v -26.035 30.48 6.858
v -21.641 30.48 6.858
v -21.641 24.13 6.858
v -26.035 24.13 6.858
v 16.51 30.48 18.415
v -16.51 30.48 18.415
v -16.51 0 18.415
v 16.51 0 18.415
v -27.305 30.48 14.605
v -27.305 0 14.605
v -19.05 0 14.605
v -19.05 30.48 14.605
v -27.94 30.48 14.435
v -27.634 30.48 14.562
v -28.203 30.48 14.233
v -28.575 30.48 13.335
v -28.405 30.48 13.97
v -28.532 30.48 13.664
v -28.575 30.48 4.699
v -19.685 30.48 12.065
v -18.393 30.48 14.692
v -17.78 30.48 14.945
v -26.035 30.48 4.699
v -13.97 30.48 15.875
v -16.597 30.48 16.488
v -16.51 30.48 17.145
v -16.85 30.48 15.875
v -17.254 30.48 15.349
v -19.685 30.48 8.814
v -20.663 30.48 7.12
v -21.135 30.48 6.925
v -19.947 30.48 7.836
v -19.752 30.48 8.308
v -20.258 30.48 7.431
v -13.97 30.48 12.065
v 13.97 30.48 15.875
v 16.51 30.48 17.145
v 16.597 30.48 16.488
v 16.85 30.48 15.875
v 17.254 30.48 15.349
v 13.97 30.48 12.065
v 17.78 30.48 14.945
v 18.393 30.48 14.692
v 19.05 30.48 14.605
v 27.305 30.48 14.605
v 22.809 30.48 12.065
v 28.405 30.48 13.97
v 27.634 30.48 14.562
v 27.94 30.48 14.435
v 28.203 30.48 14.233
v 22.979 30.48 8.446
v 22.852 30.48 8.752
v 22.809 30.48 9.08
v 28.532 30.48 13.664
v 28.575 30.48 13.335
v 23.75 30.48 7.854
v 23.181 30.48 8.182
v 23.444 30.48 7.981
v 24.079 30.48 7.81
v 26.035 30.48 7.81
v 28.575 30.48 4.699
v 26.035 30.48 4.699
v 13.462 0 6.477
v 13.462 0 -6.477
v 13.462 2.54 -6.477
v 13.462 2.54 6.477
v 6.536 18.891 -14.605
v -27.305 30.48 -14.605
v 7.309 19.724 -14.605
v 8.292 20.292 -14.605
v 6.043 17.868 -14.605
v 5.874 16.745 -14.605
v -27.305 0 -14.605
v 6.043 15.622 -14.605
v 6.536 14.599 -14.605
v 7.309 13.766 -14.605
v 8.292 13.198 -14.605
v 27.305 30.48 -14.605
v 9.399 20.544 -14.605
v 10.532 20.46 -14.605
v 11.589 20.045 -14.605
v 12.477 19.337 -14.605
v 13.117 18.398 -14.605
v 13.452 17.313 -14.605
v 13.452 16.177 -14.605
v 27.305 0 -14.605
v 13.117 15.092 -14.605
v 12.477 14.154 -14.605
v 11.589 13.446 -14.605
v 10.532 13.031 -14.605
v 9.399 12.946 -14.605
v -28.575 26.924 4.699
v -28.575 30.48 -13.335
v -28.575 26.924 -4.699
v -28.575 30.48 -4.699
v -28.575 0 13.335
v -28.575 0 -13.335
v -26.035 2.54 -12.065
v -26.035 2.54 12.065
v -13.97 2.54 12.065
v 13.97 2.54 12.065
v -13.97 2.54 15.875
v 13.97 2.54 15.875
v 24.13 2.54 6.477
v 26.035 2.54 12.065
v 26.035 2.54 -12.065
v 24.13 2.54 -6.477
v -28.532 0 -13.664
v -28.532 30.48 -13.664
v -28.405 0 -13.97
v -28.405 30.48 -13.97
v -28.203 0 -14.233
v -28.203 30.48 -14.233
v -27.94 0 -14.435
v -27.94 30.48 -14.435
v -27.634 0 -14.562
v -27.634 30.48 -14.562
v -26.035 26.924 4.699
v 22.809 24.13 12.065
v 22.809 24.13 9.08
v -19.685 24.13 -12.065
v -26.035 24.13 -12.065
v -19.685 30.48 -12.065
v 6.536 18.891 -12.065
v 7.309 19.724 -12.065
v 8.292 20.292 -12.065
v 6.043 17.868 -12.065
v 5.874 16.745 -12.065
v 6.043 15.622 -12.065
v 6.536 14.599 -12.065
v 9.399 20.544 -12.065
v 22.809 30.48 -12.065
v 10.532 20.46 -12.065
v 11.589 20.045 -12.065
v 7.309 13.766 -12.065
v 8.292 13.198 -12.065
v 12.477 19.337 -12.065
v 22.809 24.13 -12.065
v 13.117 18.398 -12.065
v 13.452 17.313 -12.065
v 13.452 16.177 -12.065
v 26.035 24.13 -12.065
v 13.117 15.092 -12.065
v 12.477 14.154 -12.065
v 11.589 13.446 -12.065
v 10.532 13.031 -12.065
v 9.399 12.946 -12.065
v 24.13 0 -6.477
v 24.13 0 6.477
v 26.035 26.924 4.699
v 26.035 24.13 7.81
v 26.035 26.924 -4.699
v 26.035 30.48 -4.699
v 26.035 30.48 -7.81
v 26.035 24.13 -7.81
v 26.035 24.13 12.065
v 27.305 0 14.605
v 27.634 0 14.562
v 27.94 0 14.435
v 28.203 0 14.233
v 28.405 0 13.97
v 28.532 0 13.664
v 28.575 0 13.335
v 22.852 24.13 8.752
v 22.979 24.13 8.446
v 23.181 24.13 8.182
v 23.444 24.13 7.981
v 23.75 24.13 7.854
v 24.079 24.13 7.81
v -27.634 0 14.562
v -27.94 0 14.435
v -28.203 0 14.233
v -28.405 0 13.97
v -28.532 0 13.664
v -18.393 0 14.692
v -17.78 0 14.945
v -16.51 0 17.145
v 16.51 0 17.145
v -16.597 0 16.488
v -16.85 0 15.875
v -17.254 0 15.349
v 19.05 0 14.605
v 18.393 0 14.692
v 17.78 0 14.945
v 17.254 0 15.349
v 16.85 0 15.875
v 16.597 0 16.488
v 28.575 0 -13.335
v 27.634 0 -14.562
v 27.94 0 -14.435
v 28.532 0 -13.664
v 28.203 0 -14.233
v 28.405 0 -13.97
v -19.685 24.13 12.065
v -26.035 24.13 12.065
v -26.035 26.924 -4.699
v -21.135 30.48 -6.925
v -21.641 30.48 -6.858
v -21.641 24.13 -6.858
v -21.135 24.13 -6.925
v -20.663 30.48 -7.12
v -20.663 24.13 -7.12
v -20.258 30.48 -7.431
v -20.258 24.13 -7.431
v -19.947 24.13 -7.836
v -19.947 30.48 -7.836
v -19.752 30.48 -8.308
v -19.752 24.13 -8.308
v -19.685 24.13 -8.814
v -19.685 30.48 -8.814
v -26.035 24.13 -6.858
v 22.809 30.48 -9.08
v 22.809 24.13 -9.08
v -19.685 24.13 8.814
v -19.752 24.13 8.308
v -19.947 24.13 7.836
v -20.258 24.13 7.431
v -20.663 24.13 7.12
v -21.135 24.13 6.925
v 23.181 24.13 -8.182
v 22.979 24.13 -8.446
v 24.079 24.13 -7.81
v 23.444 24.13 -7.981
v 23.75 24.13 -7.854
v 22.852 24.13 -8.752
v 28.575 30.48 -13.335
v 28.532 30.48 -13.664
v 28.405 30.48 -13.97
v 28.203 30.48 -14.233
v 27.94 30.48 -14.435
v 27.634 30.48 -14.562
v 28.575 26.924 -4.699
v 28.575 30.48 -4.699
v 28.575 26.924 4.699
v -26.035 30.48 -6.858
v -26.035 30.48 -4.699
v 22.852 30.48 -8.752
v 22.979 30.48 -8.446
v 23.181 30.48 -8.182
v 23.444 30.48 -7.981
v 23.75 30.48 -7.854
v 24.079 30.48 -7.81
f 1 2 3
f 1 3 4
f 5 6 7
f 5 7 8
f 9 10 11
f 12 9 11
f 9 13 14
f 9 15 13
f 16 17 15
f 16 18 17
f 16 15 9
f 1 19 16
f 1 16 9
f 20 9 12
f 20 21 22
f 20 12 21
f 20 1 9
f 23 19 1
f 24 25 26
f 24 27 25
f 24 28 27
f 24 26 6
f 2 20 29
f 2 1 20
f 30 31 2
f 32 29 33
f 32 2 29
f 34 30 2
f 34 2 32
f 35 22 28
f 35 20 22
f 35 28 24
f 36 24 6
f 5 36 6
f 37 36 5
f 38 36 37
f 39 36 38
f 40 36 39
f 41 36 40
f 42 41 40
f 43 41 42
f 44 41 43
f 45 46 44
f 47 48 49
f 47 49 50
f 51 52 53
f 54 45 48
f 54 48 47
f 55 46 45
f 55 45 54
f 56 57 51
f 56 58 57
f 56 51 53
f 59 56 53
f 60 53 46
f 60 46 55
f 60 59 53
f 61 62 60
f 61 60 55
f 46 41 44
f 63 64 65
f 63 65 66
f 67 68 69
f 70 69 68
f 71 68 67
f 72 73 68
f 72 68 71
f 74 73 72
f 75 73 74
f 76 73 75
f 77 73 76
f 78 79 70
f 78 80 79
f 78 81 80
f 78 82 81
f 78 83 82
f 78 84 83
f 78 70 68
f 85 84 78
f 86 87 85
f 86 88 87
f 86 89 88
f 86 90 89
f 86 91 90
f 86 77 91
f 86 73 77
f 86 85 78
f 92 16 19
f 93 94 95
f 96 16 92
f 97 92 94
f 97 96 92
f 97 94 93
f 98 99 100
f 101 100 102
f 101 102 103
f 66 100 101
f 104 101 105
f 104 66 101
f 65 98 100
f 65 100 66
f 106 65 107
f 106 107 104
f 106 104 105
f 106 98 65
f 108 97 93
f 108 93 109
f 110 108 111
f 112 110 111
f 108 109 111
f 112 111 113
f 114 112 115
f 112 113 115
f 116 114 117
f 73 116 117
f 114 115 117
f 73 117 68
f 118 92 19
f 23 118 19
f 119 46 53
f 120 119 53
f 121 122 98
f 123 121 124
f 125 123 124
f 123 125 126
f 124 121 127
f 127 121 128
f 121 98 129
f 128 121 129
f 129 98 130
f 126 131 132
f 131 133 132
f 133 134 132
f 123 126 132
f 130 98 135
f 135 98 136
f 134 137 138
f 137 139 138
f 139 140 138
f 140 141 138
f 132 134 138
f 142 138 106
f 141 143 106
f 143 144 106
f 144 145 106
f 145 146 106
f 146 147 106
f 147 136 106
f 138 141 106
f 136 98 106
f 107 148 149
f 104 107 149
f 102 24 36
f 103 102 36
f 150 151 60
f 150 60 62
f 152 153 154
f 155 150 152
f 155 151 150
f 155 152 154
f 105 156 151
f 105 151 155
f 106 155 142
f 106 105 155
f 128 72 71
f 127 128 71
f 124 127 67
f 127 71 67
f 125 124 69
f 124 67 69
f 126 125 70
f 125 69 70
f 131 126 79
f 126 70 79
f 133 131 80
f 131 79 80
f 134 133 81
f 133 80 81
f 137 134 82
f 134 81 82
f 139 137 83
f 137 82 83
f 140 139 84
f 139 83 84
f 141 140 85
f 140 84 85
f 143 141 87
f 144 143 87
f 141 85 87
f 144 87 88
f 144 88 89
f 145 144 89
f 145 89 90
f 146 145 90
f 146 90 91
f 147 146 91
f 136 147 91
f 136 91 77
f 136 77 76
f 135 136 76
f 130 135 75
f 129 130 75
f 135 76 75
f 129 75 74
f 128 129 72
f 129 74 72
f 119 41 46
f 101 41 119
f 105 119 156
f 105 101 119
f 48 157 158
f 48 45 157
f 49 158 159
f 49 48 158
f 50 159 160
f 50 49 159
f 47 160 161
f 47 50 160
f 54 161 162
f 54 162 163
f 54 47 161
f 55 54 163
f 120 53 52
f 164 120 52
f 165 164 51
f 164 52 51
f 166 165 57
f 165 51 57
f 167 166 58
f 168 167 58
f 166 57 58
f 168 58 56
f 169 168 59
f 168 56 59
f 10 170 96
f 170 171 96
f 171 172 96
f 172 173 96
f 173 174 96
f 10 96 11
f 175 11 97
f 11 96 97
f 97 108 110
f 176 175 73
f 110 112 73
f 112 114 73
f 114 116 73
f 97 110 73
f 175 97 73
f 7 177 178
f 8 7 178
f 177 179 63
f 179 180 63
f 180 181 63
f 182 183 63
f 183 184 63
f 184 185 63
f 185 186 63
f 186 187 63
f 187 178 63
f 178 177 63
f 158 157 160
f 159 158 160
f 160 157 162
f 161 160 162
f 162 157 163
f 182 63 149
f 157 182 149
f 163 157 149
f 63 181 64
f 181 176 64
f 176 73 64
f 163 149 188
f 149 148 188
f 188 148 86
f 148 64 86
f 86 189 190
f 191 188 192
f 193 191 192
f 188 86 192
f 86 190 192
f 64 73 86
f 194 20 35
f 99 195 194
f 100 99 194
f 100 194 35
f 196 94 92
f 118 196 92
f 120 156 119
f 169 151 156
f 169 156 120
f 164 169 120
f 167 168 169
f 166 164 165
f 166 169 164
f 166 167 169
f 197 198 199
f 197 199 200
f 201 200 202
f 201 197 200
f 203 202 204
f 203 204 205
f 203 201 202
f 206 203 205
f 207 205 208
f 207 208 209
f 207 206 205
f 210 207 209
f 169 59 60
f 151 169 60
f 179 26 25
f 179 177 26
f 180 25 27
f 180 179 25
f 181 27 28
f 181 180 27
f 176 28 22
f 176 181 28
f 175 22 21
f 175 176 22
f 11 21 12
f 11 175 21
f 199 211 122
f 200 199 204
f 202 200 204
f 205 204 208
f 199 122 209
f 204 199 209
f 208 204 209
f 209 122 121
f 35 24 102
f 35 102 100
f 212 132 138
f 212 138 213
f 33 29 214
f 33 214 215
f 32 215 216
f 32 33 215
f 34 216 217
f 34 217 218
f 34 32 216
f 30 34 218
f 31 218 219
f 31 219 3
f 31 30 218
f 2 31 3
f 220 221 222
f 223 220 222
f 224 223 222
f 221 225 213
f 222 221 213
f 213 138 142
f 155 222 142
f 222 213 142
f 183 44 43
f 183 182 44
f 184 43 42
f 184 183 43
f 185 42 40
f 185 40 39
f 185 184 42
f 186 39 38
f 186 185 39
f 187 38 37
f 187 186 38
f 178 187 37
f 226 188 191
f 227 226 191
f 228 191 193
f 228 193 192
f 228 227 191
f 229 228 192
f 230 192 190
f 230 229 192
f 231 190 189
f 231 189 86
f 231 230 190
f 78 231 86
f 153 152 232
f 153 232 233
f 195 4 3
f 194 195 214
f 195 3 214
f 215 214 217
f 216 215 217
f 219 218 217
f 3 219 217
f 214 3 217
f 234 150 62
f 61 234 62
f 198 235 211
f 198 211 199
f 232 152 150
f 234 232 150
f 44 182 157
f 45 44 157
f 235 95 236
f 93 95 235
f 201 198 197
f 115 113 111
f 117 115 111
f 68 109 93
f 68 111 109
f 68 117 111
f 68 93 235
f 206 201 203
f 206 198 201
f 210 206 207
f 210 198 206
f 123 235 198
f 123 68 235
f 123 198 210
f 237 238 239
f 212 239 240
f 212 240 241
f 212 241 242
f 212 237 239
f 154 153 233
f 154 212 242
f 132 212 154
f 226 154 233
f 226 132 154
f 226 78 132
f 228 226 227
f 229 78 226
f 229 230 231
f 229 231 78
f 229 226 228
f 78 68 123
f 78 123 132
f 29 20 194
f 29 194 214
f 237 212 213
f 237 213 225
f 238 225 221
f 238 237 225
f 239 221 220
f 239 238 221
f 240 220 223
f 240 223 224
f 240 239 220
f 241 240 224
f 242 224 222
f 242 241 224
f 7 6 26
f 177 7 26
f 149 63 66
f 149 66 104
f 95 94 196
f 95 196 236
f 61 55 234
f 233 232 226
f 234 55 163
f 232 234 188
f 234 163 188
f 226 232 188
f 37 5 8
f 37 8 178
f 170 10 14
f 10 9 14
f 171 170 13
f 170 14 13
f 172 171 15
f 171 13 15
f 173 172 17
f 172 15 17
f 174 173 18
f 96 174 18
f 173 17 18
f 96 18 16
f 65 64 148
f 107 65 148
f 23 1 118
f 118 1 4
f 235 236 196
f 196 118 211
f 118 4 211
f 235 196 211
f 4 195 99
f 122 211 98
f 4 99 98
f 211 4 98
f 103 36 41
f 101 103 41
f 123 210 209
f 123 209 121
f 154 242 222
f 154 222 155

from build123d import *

# Parameters (mm, degrees)
SKETCH1_W           = 57.15
SKETCH1_H           = 29.21
BOSS_EXTRUDE1_DEPTH = 30.48
SHELL1_T            = -2.54
SKETCH2_W           = 10.668
SKETCH2_H           = 12.954
CUT_EXTRUDE1_DEPTH  = 2.54
BOSS_EXTRUDE2_DEPTH = 6.35
CUT_EXTRUDE2_REACH  = 68.396
SKETCH4_W           = 9.398
SKETCH4_H           = 7.112
SKETCH6_W           = 33.02
SKETCH6_H           = 3.81
BOSS_EXTRUDE3_DEPTH = 30.48
SKETCH7_W           = 27.94
SKETCH7_H           = 3.81
CUT_EXTRUDE3_DEPTH  = 27.94
FILLET1_R           = 2.54
FILLET2_R           = 1.27
SKETCH8_R           = 3.81
CUT_EXTRUDE4_DEPTH  = 2.54


with BuildPart() as part:
    # Sketch1 → Boss-Extrude1 (new body)
    with BuildSketch(Plane(origin=(0, 0, 0), x_dir=(1, 0, 0), z_dir=(0, 1, 0))):
        Rectangle(SKETCH1_W, SKETCH1_H)
    extrude(amount=BOSS_EXTRUDE1_DEPTH)

    # Shell1
    shell1_openings = [part.faces().sort_by_distance(p)[0] for p in [
        (0, 30.48, 0),
    ]]
    offset(amount=SHELL1_T, openings=shell1_openings, kind=Kind.INTERSECTION)

    # Sketch2 → Cut-Extrude1 (cut)
    with BuildSketch(Plane.XZ):
        with Locations((18.796, 0)):
            Rectangle(SKETCH2_W, SKETCH2_H)
    extrude(amount=-CUT_EXTRUDE1_DEPTH, mode=Mode.SUBTRACT)

    # Sketch3 → Boss-Extrude2 (add)
    with BuildSketch(Plane(origin=(0, 30.48, 0), x_dir=(1, 0, 0), z_dir=(0, 1, 0))):
        with BuildLine():
            Line((-26.035, 12.065), (-26.035, 6.858))
            Line((-26.035, 6.858), (-21.6408, 6.858))
            ThreePointArc((-21.6408, 6.858), (-20.257840557, 7.430840557), (-19.685, 8.8138))
            Line((-19.685, 8.8138), (-19.685, 12.065))
            Line((-19.685, 12.065), (-26.035, 12.065))
        make_face()
        with BuildLine():
            Line((-19.685, -12.065), (-19.685, -8.8138))
            ThreePointArc((-19.685, -8.8138), (-20.257840557, -7.430840557), (-21.6408, -6.858))
            Line((-21.6408, -6.858), (-26.035, -6.858))
            Line((-26.035, -6.858), (-26.035, -12.065))
            Line((-26.035, -12.065), (-19.685, -12.065))
        make_face()
        with BuildLine():
            Line((26.035, 12.065), (22.8092, 12.065))
            Line((22.8092, 12.065), (22.8092, 9.0805))
            ThreePointArc((22.8092, 9.0805), (23.181174388, 8.182474388), (24.0792, 7.8105))
            Line((24.0792, 7.8105), (26.035, 7.8105))
            Line((26.035, 7.8105), (26.035, 12.065))
        make_face()
        with BuildLine():
            Line((26.035, -7.8105), (26.035, -12.065))
            Line((26.035, -12.065), (22.8092, -12.065))
            Line((22.8092, -12.065), (22.8092, -9.0805))
            ThreePointArc((22.8092, -9.0805), (23.181174388, -8.182474388), (24.0792, -7.8105))
            Line((24.0792, -7.8105), (26.035, -7.8105))
        make_face()
    extrude(amount=-BOSS_EXTRUDE2_DEPTH)

    # Cut-Extrude2: up to this face of the body (flat: up to its plane)
    cut_extrude2_end = Plane(part.part.faces().sort_by_distance((28.575, 15.24, 0))[0])
    # Sketch4 → Cut-Extrude2 (cut, up to the picked face)
    with BuildSketch(Plane.ZY.offset(28.575), mode=Mode.PRIVATE) as cut_extrude2_sk1:
        with Locations((0, 30.48)):
            Rectangle(SKETCH4_W, SKETCH4_H)
    cut_extrude2_tool1 = split(extrude(cut_extrude2_sk1.sketch, amount=-CUT_EXTRUDE2_REACH, mode=Mode.PRIVATE), bisect_by=cut_extrude2_end, keep=Keep.BOTH, mode=Mode.PRIVATE)
    add(cut_extrude2_tool1.solids().sort_by(Axis((-28.575, 30.48, 0), (1, 0, 0)))[0], mode=Mode.SUBTRACT)

    # Sketch6 → Boss-Extrude3 (add)
    with BuildSketch(Plane(origin=(0, 30.48, 0), x_dir=(1, 0, 0), z_dir=(0, 1, 0))):
        with Locations((0, -16.51)):
            Rectangle(SKETCH6_W, SKETCH6_H)
    extrude(amount=-BOSS_EXTRUDE3_DEPTH)

    # Sketch7 → Cut-Extrude3 (cut)
    with BuildSketch(Plane(origin=(0, 30.48, 0), x_dir=(1, 0, 0), z_dir=(0, 1, 0))):
        with Locations((0, -13.97)):
            Rectangle(SKETCH7_W, SKETCH7_H)
    extrude(amount=-CUT_EXTRUDE3_DEPTH, mode=Mode.SUBTRACT)

    # Fillet1
    fillet1_edges = [part.edges().sort_by_distance(p)[0] for p in [
        (16.51, 15.24, 14.605),
        (-16.51, 15.24, 14.605),
    ]]
    fillet(fillet1_edges, radius=FILLET1_R)

    # Fillet2
    fillet2_edges = [part.edges().sort_by_distance(p)[0] for p in [
        (28.575, 15.24, 14.605),
        (-28.575, 15.24, 14.605),
        (-28.575, 15.24, -14.605),
        (28.575, 15.24, -14.605),
    ]]
    fillet(fillet2_edges, radius=FILLET2_R)

    # Sketch8 → Cut-Extrude4 (cut)
    with BuildSketch(Plane(origin=(0, 0, -14.605), x_dir=(-1, 0, 0), z_dir=(0, 0, -1))):
        with Locations((-9.68413116, 16.745112741)):
            Circle(SKETCH8_R)
    extrude(amount=-CUT_EXTRUDE4_DEPTH, mode=Mode.SUBTRACT)


solid = part.part
